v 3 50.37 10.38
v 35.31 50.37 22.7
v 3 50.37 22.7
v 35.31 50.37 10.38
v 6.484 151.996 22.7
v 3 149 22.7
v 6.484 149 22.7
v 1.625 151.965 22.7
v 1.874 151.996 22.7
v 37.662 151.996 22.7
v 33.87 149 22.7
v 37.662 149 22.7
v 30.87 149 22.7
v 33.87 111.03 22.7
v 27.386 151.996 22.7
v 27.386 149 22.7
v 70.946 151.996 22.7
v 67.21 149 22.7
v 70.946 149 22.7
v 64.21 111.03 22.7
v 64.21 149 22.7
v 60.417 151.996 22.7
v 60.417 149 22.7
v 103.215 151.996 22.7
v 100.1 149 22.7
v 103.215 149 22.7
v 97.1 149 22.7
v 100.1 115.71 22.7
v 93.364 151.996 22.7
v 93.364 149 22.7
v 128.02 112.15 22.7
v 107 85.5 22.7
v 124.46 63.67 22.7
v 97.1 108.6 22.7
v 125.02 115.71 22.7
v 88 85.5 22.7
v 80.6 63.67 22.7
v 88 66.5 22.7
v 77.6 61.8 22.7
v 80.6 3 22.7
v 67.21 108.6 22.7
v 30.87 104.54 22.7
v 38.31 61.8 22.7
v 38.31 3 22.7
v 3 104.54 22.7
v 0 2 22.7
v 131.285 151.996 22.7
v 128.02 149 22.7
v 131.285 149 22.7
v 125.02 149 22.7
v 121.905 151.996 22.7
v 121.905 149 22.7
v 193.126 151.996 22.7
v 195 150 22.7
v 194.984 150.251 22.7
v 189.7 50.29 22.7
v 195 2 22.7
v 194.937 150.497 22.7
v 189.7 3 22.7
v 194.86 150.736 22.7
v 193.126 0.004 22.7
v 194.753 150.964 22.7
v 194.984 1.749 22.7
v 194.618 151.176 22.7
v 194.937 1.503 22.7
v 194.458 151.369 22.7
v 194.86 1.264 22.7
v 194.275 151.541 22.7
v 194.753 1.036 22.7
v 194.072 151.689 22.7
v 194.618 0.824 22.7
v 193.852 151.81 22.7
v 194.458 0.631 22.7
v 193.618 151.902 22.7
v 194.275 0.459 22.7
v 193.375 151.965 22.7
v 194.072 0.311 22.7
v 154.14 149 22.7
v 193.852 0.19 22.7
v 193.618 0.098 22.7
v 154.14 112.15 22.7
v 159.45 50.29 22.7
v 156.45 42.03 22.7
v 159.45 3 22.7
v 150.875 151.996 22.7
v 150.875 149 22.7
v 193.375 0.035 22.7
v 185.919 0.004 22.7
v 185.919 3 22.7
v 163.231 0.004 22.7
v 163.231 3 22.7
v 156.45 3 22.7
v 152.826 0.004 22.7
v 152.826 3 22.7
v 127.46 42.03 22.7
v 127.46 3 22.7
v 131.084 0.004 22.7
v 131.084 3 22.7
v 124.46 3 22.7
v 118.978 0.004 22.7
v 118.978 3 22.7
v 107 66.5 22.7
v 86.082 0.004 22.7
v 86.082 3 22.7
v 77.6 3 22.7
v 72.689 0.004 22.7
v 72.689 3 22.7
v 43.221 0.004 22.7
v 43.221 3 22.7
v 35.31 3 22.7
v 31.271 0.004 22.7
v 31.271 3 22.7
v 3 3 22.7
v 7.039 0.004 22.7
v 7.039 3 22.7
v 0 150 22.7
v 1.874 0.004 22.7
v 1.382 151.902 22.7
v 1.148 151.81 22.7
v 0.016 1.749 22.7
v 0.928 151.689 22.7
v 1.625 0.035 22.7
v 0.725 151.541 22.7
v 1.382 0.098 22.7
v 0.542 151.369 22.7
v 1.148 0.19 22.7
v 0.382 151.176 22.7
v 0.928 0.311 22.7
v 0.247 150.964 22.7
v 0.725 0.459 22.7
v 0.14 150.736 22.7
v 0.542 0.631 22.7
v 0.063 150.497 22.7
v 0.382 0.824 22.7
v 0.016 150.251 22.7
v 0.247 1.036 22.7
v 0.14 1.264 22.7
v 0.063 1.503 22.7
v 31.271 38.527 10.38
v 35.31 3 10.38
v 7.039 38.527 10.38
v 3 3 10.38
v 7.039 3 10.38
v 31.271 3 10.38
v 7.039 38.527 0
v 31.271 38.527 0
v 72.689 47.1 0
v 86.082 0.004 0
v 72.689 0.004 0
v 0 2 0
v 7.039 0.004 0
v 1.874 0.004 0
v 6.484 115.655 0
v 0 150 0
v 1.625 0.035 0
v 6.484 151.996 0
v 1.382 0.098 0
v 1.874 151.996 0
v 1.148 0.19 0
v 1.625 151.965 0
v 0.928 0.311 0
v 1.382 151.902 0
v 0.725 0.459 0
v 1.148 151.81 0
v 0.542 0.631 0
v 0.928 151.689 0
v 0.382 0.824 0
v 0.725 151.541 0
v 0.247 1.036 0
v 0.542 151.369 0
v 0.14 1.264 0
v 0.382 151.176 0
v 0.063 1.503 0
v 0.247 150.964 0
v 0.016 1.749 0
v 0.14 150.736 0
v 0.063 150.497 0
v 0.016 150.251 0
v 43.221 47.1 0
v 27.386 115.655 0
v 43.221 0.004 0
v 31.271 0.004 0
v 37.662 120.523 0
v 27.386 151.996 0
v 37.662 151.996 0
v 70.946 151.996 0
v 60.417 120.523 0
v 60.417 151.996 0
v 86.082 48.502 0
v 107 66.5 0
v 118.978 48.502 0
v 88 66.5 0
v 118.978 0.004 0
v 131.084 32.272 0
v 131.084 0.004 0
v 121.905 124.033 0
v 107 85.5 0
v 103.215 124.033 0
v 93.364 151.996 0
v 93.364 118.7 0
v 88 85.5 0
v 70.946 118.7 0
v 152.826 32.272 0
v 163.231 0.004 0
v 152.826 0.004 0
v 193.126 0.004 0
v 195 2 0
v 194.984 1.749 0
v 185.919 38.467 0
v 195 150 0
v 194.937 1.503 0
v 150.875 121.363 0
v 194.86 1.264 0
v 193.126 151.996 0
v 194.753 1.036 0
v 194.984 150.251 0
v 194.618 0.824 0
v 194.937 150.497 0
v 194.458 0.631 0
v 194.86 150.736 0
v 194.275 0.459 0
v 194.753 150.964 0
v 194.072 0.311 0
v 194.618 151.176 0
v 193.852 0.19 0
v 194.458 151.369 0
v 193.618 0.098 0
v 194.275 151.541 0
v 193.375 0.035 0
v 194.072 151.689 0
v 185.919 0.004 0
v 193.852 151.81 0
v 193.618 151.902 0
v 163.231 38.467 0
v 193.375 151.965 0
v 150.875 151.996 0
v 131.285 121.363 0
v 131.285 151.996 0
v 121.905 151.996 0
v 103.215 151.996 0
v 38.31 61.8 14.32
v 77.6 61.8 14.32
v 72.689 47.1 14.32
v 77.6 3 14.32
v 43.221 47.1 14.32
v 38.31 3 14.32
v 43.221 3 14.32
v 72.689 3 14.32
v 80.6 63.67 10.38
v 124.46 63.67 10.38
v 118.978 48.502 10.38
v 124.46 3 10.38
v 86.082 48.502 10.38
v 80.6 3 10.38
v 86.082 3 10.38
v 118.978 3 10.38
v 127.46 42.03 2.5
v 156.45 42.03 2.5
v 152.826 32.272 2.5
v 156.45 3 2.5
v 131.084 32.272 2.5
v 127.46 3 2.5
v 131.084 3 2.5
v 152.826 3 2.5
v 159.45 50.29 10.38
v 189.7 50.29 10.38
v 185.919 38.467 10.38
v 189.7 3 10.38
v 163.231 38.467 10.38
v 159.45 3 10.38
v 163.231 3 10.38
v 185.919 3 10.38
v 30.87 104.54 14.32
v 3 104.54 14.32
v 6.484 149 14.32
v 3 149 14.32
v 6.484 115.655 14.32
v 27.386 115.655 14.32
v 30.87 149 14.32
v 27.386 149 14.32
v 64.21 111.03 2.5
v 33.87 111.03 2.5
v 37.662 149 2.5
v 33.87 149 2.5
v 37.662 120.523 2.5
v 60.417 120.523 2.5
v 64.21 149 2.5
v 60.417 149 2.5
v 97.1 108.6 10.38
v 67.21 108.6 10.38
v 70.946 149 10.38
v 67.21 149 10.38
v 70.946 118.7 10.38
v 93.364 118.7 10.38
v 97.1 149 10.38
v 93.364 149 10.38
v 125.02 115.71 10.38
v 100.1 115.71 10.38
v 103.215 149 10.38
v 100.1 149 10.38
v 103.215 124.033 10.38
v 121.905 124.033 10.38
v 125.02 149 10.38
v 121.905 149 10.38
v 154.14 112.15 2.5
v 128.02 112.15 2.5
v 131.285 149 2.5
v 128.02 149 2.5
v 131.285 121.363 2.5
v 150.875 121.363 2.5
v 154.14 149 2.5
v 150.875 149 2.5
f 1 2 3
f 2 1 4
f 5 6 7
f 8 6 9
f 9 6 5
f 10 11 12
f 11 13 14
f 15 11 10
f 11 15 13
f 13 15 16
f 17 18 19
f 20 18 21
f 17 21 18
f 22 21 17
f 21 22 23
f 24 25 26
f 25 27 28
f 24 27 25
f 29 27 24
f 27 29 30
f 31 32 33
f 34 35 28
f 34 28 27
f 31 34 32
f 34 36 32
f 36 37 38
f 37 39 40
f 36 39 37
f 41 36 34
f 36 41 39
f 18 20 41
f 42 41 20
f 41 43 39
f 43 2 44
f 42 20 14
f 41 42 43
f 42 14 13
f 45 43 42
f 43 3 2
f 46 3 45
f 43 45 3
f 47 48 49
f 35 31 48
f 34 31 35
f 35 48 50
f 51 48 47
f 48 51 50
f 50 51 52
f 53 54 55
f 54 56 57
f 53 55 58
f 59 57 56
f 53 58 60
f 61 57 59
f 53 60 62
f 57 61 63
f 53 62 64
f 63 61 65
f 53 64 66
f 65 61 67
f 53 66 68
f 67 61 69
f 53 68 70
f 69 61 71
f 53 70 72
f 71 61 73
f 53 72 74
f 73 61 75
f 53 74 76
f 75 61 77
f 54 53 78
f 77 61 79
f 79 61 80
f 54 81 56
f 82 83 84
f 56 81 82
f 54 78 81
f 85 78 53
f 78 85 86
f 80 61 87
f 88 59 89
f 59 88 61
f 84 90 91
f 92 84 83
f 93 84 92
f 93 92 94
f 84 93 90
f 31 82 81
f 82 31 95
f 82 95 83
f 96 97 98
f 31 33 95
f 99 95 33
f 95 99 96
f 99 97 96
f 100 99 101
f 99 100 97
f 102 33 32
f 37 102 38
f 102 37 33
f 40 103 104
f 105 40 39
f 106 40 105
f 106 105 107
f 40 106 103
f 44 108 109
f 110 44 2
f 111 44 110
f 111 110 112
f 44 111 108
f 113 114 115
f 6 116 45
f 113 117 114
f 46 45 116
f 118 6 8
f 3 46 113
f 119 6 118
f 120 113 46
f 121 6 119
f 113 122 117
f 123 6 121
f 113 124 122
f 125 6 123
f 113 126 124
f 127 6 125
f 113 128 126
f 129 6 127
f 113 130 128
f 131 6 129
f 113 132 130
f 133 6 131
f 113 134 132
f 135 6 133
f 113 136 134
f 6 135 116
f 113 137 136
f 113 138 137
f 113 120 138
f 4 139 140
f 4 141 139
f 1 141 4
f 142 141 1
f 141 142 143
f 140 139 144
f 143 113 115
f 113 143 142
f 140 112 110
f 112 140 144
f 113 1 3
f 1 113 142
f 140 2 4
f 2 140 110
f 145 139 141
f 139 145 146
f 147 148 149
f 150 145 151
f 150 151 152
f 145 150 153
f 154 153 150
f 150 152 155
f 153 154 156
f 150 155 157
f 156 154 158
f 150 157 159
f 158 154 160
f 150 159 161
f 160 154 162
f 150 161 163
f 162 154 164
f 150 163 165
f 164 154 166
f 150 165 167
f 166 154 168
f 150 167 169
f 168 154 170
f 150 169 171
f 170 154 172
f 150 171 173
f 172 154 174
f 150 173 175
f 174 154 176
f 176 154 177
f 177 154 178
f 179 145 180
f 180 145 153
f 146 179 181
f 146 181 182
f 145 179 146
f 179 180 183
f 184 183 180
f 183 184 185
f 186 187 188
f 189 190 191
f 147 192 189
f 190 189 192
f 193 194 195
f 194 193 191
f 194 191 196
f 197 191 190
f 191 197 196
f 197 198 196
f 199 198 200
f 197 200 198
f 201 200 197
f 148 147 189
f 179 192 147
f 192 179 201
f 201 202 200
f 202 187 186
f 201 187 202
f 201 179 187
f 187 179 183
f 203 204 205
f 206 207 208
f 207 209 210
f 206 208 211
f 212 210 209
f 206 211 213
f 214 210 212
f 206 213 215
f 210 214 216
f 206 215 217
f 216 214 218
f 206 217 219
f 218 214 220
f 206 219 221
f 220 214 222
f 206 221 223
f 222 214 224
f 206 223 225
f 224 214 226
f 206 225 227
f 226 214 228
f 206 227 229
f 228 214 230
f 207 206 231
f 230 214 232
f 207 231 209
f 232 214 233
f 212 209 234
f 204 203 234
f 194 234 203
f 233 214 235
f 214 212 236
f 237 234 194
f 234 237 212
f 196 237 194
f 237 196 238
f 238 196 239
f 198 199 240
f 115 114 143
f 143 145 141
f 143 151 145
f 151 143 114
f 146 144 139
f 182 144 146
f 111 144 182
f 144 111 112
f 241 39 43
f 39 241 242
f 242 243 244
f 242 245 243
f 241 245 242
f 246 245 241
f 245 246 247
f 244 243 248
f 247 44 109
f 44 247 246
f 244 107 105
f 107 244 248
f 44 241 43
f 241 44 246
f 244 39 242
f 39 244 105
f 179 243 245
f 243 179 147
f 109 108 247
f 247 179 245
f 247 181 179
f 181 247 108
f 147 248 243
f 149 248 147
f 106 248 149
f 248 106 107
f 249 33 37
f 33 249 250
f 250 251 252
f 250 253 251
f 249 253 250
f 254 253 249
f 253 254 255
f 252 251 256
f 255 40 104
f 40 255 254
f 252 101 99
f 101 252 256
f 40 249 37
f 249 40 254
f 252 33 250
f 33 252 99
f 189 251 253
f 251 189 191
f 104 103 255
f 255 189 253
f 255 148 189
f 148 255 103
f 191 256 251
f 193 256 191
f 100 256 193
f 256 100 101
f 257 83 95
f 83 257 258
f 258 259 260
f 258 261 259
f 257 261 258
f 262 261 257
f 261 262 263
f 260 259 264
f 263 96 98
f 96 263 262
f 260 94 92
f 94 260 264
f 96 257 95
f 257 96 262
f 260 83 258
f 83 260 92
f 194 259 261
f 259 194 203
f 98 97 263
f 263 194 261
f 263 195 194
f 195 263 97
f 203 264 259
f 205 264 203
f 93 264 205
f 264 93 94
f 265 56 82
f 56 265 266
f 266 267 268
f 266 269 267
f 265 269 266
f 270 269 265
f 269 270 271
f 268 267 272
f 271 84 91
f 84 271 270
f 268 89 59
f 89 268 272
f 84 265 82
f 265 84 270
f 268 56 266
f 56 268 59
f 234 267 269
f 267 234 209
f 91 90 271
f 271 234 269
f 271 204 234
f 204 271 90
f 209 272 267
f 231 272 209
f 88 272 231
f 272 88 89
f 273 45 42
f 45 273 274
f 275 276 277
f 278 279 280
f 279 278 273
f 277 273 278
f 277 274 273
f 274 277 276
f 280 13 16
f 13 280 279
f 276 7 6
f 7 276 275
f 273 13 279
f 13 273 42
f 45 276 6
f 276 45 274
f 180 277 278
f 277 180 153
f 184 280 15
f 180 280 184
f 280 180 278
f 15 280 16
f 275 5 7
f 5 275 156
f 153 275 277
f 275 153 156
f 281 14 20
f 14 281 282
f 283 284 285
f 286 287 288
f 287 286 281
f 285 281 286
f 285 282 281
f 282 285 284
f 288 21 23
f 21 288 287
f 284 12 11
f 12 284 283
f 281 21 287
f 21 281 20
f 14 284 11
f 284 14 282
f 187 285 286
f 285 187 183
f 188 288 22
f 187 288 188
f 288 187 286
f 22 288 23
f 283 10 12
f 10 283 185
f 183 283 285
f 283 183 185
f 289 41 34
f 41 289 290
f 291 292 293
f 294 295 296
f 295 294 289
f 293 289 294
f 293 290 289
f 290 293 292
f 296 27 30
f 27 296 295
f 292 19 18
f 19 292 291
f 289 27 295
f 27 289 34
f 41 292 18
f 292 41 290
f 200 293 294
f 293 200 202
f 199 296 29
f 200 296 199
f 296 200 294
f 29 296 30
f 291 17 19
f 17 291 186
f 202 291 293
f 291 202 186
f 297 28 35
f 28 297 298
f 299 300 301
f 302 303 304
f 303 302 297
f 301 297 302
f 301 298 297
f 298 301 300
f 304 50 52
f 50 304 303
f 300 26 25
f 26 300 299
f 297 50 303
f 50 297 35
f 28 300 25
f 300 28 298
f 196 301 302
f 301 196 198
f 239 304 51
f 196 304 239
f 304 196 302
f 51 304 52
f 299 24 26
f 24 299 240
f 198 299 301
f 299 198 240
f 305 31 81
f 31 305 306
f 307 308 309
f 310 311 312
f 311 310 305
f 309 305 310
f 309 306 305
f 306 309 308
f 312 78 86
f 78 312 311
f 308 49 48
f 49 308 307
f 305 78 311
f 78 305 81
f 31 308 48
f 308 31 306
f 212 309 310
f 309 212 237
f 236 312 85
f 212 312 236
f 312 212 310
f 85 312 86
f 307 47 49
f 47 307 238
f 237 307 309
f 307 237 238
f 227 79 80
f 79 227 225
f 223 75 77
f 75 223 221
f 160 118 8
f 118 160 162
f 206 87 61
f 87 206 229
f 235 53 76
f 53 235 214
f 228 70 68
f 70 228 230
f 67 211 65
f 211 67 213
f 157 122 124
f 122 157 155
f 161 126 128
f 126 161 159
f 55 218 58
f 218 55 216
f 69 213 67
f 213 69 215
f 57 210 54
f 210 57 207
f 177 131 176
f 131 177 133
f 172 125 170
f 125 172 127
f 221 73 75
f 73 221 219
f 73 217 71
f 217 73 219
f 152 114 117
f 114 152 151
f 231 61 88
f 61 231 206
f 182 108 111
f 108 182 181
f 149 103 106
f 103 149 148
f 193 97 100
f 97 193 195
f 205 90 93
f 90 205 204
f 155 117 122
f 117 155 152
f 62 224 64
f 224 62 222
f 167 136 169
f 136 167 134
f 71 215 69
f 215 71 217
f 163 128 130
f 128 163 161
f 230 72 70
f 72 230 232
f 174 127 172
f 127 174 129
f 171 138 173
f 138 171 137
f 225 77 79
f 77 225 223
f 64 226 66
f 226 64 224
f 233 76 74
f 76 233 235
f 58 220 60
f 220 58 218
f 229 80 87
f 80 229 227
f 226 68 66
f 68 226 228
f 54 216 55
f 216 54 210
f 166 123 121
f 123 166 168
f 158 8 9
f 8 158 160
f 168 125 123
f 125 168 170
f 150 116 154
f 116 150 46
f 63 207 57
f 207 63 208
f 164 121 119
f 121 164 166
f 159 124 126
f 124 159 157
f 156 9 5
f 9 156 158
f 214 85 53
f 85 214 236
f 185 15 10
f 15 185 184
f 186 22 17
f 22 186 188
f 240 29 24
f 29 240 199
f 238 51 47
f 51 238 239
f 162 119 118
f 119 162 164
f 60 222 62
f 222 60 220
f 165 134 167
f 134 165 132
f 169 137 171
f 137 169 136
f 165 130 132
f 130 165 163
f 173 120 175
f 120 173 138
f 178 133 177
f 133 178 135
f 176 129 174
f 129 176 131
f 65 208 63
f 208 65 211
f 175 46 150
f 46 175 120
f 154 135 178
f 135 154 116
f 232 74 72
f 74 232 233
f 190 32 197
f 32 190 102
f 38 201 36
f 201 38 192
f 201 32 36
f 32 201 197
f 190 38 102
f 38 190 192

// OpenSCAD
// file: SquarePileLib.scad
module LeftPile(wallThickness, totalHeight, singlePileHeight, singlePileWidth, singlePileLength, pileCount, openingSizePercent = .75){
    pileHeight = (pileCount * singlePileHeight) + .5;
    lengthOpeningSize = singlePileLength * openingSizePercent;
    widthOpeningSize = singlePileWidth * openingSizePercent;
    blockerSize = (singlePileWidth - widthOpeningSize) / 2;
    
    translate([wallThickness, wallThickness, totalHeight - pileHeight])
        cube([singlePileLength, singlePileWidth, pileHeight]);
    translate([-.00001, wallThickness + (blockerSize), 0])
        cube([wallThickness + lengthOpeningSize, widthOpeningSize, totalHeight]);
}

module RightPile(wallThickness, totalHeight, singlePileHeight, singlePileWidth, singlePileLength, pileCount, openingSizePercent = .75){
    translate([0, wallThickness + wallThickness + singlePileWidth, 0])
        rotate([0, 0, 180])
            LeftPile(wallThickness, totalHeight, singlePileHeight, singlePileWidth, singlePileLength, pileCount, openingSizePercent);
}

module BottomPile(wallThickness, totalHeight, singlePileHeight, singlePileWidth, singlePileLength, pileCount, openingSizePercent = .75){
    translate([wallThickness + wallThickness + singlePileWidth, 0, 0])
        rotate([0, 0, 90])
            LeftPile(wallThickness, totalHeight, singlePileHeight, singlePileWidth, singlePileLength, pileCount, openingSizePercent);
}

module TopPile(wallThickness, totalHeight, singlePileHeight, singlePileWidth, singlePileLength, pileCount, openingSizePercent = .75){
        rotate([0, 0, 270])
            LeftPile(wallThickness, totalHeight, singlePileHeight, singlePileWidth, singlePileLength, pileCount, openingSizePercent);
}
// main file
include<SquarePileLib.scad>

length = 195;

magnetHoleWidth = 19;
wallThickness = 3;
singlePileHeight = 1.97;
maxTokenHeight = 62;
maxTokenCount = 10;
width = wallThickness + maxTokenHeight + wallThickness + magnetHoleWidth + maxTokenHeight + wallThickness;
height = wallThickness + (maxTokenCount * singlePileHeight);

token1Width = 31.31 + 1;
token1Height = 46.37 + 1;
token1Count = 6;
token2Width = 38.29 + 1;
token2Height = 57.8 + 1;
token2Count = 4;
token3Width = 42.86 + 1;
token3Height = 59.67 + 1;
token3Count = 6;
token4Width = 27.99 + 1;
token4Height = 38.03 + 1;
token4Count = 10;
token5Width = 29.25 + 1;
token5Height = 46.29 + 1;
token5Count = 6;
token6Width = 26.87 + 1;
token6Height = 43.46 + 1;
token6Count = 4;
token7Width = 29.34 + 1;
token7Height = 36.97 + 1;
token7Count = 10;
token8Width = 28.89 + 1;
token8Height = 39.4 + 1;
token8Count = 6;
token9Width = 23.92 + 1;
token9Height = 32.29 + 1;
token9Count = 6;
token10Width = 25.12 + 1;
token10Height = 35.85 + 1;
token10Count = 10;


difference() {

    $fn=50;
    minkowski()
    {
      translate([2,2,0])
        cube([length-4, width-4, height - 1]);
      cylinder(r=2,h=1);
    }
    translate([0, 0, 0])
        BottomPile(
            wallThickness,
            height,
            singlePileHeight,
            token1Width,
            token1Height,
            token1Count
        );
    translate([token1Width + wallThickness, 0, 0])
        BottomPile(
            wallThickness,
            height,
            singlePileHeight,
            token2Width,
            token2Height,
            token2Count
        );
    translate([token1Width + token2Width + wallThickness * 2, 0, 0])
        BottomPile(
            wallThickness,
            height,
            singlePileHeight,
            token3Width,
            token3Height,
            token3Count
        );
    translate([token1Width + token2Width + token3Width + wallThickness * 3, 0, 0])
        BottomPile(
            wallThickness,
            height,
            singlePileHeight,
            token4Width,
            token4Height,
            token4Count
        );
    translate([token1Width + token2Width + token3Width + token4Width + wallThickness * 4, 0, 0])
        BottomPile(
            wallThickness,
            height,
            singlePileHeight,
            token5Width,
            token5Height,
            token5Count
        );
    
    translate([0, width, 0])
        TopPile(
            wallThickness,
            height,
            singlePileHeight,
            token6Width,
            token6Height,
            token6Count
        );
    translate([token6Width + wallThickness, width, 0])
        TopPile(
            wallThickness,
            height,
            singlePileHeight,
            token7Width,
            token7Height,
            token7Count
        );
    translate([token6Width + token7Width + wallThickness * 2, width, 0])
        TopPile(
            wallThickness,
            height,
            singlePileHeight,
            token8Width,
            token8Height,
            token8Count
        );
    translate([token6Width + token7Width + token8Width + wallThickness * 3, width, 0])
        TopPile(
            wallThickness,
            height,
            singlePileHeight,
            token9Width,
            token9Height,
            token9Count
        );
    translate([token6Width + token7Width + token8Width + token9Width + wallThickness * 4, width, 0])
        TopPile(
            wallThickness,
            height,
            singlePileHeight,
            token10Width,
            token10Height,
            token10Count
        );

    
    translate([length/2 - magnetHoleWidth/2, width/2 - magnetHoleWidth/2, 0])
        cube([magnetHoleWidth, magnetHoleWidth, height]);
}
